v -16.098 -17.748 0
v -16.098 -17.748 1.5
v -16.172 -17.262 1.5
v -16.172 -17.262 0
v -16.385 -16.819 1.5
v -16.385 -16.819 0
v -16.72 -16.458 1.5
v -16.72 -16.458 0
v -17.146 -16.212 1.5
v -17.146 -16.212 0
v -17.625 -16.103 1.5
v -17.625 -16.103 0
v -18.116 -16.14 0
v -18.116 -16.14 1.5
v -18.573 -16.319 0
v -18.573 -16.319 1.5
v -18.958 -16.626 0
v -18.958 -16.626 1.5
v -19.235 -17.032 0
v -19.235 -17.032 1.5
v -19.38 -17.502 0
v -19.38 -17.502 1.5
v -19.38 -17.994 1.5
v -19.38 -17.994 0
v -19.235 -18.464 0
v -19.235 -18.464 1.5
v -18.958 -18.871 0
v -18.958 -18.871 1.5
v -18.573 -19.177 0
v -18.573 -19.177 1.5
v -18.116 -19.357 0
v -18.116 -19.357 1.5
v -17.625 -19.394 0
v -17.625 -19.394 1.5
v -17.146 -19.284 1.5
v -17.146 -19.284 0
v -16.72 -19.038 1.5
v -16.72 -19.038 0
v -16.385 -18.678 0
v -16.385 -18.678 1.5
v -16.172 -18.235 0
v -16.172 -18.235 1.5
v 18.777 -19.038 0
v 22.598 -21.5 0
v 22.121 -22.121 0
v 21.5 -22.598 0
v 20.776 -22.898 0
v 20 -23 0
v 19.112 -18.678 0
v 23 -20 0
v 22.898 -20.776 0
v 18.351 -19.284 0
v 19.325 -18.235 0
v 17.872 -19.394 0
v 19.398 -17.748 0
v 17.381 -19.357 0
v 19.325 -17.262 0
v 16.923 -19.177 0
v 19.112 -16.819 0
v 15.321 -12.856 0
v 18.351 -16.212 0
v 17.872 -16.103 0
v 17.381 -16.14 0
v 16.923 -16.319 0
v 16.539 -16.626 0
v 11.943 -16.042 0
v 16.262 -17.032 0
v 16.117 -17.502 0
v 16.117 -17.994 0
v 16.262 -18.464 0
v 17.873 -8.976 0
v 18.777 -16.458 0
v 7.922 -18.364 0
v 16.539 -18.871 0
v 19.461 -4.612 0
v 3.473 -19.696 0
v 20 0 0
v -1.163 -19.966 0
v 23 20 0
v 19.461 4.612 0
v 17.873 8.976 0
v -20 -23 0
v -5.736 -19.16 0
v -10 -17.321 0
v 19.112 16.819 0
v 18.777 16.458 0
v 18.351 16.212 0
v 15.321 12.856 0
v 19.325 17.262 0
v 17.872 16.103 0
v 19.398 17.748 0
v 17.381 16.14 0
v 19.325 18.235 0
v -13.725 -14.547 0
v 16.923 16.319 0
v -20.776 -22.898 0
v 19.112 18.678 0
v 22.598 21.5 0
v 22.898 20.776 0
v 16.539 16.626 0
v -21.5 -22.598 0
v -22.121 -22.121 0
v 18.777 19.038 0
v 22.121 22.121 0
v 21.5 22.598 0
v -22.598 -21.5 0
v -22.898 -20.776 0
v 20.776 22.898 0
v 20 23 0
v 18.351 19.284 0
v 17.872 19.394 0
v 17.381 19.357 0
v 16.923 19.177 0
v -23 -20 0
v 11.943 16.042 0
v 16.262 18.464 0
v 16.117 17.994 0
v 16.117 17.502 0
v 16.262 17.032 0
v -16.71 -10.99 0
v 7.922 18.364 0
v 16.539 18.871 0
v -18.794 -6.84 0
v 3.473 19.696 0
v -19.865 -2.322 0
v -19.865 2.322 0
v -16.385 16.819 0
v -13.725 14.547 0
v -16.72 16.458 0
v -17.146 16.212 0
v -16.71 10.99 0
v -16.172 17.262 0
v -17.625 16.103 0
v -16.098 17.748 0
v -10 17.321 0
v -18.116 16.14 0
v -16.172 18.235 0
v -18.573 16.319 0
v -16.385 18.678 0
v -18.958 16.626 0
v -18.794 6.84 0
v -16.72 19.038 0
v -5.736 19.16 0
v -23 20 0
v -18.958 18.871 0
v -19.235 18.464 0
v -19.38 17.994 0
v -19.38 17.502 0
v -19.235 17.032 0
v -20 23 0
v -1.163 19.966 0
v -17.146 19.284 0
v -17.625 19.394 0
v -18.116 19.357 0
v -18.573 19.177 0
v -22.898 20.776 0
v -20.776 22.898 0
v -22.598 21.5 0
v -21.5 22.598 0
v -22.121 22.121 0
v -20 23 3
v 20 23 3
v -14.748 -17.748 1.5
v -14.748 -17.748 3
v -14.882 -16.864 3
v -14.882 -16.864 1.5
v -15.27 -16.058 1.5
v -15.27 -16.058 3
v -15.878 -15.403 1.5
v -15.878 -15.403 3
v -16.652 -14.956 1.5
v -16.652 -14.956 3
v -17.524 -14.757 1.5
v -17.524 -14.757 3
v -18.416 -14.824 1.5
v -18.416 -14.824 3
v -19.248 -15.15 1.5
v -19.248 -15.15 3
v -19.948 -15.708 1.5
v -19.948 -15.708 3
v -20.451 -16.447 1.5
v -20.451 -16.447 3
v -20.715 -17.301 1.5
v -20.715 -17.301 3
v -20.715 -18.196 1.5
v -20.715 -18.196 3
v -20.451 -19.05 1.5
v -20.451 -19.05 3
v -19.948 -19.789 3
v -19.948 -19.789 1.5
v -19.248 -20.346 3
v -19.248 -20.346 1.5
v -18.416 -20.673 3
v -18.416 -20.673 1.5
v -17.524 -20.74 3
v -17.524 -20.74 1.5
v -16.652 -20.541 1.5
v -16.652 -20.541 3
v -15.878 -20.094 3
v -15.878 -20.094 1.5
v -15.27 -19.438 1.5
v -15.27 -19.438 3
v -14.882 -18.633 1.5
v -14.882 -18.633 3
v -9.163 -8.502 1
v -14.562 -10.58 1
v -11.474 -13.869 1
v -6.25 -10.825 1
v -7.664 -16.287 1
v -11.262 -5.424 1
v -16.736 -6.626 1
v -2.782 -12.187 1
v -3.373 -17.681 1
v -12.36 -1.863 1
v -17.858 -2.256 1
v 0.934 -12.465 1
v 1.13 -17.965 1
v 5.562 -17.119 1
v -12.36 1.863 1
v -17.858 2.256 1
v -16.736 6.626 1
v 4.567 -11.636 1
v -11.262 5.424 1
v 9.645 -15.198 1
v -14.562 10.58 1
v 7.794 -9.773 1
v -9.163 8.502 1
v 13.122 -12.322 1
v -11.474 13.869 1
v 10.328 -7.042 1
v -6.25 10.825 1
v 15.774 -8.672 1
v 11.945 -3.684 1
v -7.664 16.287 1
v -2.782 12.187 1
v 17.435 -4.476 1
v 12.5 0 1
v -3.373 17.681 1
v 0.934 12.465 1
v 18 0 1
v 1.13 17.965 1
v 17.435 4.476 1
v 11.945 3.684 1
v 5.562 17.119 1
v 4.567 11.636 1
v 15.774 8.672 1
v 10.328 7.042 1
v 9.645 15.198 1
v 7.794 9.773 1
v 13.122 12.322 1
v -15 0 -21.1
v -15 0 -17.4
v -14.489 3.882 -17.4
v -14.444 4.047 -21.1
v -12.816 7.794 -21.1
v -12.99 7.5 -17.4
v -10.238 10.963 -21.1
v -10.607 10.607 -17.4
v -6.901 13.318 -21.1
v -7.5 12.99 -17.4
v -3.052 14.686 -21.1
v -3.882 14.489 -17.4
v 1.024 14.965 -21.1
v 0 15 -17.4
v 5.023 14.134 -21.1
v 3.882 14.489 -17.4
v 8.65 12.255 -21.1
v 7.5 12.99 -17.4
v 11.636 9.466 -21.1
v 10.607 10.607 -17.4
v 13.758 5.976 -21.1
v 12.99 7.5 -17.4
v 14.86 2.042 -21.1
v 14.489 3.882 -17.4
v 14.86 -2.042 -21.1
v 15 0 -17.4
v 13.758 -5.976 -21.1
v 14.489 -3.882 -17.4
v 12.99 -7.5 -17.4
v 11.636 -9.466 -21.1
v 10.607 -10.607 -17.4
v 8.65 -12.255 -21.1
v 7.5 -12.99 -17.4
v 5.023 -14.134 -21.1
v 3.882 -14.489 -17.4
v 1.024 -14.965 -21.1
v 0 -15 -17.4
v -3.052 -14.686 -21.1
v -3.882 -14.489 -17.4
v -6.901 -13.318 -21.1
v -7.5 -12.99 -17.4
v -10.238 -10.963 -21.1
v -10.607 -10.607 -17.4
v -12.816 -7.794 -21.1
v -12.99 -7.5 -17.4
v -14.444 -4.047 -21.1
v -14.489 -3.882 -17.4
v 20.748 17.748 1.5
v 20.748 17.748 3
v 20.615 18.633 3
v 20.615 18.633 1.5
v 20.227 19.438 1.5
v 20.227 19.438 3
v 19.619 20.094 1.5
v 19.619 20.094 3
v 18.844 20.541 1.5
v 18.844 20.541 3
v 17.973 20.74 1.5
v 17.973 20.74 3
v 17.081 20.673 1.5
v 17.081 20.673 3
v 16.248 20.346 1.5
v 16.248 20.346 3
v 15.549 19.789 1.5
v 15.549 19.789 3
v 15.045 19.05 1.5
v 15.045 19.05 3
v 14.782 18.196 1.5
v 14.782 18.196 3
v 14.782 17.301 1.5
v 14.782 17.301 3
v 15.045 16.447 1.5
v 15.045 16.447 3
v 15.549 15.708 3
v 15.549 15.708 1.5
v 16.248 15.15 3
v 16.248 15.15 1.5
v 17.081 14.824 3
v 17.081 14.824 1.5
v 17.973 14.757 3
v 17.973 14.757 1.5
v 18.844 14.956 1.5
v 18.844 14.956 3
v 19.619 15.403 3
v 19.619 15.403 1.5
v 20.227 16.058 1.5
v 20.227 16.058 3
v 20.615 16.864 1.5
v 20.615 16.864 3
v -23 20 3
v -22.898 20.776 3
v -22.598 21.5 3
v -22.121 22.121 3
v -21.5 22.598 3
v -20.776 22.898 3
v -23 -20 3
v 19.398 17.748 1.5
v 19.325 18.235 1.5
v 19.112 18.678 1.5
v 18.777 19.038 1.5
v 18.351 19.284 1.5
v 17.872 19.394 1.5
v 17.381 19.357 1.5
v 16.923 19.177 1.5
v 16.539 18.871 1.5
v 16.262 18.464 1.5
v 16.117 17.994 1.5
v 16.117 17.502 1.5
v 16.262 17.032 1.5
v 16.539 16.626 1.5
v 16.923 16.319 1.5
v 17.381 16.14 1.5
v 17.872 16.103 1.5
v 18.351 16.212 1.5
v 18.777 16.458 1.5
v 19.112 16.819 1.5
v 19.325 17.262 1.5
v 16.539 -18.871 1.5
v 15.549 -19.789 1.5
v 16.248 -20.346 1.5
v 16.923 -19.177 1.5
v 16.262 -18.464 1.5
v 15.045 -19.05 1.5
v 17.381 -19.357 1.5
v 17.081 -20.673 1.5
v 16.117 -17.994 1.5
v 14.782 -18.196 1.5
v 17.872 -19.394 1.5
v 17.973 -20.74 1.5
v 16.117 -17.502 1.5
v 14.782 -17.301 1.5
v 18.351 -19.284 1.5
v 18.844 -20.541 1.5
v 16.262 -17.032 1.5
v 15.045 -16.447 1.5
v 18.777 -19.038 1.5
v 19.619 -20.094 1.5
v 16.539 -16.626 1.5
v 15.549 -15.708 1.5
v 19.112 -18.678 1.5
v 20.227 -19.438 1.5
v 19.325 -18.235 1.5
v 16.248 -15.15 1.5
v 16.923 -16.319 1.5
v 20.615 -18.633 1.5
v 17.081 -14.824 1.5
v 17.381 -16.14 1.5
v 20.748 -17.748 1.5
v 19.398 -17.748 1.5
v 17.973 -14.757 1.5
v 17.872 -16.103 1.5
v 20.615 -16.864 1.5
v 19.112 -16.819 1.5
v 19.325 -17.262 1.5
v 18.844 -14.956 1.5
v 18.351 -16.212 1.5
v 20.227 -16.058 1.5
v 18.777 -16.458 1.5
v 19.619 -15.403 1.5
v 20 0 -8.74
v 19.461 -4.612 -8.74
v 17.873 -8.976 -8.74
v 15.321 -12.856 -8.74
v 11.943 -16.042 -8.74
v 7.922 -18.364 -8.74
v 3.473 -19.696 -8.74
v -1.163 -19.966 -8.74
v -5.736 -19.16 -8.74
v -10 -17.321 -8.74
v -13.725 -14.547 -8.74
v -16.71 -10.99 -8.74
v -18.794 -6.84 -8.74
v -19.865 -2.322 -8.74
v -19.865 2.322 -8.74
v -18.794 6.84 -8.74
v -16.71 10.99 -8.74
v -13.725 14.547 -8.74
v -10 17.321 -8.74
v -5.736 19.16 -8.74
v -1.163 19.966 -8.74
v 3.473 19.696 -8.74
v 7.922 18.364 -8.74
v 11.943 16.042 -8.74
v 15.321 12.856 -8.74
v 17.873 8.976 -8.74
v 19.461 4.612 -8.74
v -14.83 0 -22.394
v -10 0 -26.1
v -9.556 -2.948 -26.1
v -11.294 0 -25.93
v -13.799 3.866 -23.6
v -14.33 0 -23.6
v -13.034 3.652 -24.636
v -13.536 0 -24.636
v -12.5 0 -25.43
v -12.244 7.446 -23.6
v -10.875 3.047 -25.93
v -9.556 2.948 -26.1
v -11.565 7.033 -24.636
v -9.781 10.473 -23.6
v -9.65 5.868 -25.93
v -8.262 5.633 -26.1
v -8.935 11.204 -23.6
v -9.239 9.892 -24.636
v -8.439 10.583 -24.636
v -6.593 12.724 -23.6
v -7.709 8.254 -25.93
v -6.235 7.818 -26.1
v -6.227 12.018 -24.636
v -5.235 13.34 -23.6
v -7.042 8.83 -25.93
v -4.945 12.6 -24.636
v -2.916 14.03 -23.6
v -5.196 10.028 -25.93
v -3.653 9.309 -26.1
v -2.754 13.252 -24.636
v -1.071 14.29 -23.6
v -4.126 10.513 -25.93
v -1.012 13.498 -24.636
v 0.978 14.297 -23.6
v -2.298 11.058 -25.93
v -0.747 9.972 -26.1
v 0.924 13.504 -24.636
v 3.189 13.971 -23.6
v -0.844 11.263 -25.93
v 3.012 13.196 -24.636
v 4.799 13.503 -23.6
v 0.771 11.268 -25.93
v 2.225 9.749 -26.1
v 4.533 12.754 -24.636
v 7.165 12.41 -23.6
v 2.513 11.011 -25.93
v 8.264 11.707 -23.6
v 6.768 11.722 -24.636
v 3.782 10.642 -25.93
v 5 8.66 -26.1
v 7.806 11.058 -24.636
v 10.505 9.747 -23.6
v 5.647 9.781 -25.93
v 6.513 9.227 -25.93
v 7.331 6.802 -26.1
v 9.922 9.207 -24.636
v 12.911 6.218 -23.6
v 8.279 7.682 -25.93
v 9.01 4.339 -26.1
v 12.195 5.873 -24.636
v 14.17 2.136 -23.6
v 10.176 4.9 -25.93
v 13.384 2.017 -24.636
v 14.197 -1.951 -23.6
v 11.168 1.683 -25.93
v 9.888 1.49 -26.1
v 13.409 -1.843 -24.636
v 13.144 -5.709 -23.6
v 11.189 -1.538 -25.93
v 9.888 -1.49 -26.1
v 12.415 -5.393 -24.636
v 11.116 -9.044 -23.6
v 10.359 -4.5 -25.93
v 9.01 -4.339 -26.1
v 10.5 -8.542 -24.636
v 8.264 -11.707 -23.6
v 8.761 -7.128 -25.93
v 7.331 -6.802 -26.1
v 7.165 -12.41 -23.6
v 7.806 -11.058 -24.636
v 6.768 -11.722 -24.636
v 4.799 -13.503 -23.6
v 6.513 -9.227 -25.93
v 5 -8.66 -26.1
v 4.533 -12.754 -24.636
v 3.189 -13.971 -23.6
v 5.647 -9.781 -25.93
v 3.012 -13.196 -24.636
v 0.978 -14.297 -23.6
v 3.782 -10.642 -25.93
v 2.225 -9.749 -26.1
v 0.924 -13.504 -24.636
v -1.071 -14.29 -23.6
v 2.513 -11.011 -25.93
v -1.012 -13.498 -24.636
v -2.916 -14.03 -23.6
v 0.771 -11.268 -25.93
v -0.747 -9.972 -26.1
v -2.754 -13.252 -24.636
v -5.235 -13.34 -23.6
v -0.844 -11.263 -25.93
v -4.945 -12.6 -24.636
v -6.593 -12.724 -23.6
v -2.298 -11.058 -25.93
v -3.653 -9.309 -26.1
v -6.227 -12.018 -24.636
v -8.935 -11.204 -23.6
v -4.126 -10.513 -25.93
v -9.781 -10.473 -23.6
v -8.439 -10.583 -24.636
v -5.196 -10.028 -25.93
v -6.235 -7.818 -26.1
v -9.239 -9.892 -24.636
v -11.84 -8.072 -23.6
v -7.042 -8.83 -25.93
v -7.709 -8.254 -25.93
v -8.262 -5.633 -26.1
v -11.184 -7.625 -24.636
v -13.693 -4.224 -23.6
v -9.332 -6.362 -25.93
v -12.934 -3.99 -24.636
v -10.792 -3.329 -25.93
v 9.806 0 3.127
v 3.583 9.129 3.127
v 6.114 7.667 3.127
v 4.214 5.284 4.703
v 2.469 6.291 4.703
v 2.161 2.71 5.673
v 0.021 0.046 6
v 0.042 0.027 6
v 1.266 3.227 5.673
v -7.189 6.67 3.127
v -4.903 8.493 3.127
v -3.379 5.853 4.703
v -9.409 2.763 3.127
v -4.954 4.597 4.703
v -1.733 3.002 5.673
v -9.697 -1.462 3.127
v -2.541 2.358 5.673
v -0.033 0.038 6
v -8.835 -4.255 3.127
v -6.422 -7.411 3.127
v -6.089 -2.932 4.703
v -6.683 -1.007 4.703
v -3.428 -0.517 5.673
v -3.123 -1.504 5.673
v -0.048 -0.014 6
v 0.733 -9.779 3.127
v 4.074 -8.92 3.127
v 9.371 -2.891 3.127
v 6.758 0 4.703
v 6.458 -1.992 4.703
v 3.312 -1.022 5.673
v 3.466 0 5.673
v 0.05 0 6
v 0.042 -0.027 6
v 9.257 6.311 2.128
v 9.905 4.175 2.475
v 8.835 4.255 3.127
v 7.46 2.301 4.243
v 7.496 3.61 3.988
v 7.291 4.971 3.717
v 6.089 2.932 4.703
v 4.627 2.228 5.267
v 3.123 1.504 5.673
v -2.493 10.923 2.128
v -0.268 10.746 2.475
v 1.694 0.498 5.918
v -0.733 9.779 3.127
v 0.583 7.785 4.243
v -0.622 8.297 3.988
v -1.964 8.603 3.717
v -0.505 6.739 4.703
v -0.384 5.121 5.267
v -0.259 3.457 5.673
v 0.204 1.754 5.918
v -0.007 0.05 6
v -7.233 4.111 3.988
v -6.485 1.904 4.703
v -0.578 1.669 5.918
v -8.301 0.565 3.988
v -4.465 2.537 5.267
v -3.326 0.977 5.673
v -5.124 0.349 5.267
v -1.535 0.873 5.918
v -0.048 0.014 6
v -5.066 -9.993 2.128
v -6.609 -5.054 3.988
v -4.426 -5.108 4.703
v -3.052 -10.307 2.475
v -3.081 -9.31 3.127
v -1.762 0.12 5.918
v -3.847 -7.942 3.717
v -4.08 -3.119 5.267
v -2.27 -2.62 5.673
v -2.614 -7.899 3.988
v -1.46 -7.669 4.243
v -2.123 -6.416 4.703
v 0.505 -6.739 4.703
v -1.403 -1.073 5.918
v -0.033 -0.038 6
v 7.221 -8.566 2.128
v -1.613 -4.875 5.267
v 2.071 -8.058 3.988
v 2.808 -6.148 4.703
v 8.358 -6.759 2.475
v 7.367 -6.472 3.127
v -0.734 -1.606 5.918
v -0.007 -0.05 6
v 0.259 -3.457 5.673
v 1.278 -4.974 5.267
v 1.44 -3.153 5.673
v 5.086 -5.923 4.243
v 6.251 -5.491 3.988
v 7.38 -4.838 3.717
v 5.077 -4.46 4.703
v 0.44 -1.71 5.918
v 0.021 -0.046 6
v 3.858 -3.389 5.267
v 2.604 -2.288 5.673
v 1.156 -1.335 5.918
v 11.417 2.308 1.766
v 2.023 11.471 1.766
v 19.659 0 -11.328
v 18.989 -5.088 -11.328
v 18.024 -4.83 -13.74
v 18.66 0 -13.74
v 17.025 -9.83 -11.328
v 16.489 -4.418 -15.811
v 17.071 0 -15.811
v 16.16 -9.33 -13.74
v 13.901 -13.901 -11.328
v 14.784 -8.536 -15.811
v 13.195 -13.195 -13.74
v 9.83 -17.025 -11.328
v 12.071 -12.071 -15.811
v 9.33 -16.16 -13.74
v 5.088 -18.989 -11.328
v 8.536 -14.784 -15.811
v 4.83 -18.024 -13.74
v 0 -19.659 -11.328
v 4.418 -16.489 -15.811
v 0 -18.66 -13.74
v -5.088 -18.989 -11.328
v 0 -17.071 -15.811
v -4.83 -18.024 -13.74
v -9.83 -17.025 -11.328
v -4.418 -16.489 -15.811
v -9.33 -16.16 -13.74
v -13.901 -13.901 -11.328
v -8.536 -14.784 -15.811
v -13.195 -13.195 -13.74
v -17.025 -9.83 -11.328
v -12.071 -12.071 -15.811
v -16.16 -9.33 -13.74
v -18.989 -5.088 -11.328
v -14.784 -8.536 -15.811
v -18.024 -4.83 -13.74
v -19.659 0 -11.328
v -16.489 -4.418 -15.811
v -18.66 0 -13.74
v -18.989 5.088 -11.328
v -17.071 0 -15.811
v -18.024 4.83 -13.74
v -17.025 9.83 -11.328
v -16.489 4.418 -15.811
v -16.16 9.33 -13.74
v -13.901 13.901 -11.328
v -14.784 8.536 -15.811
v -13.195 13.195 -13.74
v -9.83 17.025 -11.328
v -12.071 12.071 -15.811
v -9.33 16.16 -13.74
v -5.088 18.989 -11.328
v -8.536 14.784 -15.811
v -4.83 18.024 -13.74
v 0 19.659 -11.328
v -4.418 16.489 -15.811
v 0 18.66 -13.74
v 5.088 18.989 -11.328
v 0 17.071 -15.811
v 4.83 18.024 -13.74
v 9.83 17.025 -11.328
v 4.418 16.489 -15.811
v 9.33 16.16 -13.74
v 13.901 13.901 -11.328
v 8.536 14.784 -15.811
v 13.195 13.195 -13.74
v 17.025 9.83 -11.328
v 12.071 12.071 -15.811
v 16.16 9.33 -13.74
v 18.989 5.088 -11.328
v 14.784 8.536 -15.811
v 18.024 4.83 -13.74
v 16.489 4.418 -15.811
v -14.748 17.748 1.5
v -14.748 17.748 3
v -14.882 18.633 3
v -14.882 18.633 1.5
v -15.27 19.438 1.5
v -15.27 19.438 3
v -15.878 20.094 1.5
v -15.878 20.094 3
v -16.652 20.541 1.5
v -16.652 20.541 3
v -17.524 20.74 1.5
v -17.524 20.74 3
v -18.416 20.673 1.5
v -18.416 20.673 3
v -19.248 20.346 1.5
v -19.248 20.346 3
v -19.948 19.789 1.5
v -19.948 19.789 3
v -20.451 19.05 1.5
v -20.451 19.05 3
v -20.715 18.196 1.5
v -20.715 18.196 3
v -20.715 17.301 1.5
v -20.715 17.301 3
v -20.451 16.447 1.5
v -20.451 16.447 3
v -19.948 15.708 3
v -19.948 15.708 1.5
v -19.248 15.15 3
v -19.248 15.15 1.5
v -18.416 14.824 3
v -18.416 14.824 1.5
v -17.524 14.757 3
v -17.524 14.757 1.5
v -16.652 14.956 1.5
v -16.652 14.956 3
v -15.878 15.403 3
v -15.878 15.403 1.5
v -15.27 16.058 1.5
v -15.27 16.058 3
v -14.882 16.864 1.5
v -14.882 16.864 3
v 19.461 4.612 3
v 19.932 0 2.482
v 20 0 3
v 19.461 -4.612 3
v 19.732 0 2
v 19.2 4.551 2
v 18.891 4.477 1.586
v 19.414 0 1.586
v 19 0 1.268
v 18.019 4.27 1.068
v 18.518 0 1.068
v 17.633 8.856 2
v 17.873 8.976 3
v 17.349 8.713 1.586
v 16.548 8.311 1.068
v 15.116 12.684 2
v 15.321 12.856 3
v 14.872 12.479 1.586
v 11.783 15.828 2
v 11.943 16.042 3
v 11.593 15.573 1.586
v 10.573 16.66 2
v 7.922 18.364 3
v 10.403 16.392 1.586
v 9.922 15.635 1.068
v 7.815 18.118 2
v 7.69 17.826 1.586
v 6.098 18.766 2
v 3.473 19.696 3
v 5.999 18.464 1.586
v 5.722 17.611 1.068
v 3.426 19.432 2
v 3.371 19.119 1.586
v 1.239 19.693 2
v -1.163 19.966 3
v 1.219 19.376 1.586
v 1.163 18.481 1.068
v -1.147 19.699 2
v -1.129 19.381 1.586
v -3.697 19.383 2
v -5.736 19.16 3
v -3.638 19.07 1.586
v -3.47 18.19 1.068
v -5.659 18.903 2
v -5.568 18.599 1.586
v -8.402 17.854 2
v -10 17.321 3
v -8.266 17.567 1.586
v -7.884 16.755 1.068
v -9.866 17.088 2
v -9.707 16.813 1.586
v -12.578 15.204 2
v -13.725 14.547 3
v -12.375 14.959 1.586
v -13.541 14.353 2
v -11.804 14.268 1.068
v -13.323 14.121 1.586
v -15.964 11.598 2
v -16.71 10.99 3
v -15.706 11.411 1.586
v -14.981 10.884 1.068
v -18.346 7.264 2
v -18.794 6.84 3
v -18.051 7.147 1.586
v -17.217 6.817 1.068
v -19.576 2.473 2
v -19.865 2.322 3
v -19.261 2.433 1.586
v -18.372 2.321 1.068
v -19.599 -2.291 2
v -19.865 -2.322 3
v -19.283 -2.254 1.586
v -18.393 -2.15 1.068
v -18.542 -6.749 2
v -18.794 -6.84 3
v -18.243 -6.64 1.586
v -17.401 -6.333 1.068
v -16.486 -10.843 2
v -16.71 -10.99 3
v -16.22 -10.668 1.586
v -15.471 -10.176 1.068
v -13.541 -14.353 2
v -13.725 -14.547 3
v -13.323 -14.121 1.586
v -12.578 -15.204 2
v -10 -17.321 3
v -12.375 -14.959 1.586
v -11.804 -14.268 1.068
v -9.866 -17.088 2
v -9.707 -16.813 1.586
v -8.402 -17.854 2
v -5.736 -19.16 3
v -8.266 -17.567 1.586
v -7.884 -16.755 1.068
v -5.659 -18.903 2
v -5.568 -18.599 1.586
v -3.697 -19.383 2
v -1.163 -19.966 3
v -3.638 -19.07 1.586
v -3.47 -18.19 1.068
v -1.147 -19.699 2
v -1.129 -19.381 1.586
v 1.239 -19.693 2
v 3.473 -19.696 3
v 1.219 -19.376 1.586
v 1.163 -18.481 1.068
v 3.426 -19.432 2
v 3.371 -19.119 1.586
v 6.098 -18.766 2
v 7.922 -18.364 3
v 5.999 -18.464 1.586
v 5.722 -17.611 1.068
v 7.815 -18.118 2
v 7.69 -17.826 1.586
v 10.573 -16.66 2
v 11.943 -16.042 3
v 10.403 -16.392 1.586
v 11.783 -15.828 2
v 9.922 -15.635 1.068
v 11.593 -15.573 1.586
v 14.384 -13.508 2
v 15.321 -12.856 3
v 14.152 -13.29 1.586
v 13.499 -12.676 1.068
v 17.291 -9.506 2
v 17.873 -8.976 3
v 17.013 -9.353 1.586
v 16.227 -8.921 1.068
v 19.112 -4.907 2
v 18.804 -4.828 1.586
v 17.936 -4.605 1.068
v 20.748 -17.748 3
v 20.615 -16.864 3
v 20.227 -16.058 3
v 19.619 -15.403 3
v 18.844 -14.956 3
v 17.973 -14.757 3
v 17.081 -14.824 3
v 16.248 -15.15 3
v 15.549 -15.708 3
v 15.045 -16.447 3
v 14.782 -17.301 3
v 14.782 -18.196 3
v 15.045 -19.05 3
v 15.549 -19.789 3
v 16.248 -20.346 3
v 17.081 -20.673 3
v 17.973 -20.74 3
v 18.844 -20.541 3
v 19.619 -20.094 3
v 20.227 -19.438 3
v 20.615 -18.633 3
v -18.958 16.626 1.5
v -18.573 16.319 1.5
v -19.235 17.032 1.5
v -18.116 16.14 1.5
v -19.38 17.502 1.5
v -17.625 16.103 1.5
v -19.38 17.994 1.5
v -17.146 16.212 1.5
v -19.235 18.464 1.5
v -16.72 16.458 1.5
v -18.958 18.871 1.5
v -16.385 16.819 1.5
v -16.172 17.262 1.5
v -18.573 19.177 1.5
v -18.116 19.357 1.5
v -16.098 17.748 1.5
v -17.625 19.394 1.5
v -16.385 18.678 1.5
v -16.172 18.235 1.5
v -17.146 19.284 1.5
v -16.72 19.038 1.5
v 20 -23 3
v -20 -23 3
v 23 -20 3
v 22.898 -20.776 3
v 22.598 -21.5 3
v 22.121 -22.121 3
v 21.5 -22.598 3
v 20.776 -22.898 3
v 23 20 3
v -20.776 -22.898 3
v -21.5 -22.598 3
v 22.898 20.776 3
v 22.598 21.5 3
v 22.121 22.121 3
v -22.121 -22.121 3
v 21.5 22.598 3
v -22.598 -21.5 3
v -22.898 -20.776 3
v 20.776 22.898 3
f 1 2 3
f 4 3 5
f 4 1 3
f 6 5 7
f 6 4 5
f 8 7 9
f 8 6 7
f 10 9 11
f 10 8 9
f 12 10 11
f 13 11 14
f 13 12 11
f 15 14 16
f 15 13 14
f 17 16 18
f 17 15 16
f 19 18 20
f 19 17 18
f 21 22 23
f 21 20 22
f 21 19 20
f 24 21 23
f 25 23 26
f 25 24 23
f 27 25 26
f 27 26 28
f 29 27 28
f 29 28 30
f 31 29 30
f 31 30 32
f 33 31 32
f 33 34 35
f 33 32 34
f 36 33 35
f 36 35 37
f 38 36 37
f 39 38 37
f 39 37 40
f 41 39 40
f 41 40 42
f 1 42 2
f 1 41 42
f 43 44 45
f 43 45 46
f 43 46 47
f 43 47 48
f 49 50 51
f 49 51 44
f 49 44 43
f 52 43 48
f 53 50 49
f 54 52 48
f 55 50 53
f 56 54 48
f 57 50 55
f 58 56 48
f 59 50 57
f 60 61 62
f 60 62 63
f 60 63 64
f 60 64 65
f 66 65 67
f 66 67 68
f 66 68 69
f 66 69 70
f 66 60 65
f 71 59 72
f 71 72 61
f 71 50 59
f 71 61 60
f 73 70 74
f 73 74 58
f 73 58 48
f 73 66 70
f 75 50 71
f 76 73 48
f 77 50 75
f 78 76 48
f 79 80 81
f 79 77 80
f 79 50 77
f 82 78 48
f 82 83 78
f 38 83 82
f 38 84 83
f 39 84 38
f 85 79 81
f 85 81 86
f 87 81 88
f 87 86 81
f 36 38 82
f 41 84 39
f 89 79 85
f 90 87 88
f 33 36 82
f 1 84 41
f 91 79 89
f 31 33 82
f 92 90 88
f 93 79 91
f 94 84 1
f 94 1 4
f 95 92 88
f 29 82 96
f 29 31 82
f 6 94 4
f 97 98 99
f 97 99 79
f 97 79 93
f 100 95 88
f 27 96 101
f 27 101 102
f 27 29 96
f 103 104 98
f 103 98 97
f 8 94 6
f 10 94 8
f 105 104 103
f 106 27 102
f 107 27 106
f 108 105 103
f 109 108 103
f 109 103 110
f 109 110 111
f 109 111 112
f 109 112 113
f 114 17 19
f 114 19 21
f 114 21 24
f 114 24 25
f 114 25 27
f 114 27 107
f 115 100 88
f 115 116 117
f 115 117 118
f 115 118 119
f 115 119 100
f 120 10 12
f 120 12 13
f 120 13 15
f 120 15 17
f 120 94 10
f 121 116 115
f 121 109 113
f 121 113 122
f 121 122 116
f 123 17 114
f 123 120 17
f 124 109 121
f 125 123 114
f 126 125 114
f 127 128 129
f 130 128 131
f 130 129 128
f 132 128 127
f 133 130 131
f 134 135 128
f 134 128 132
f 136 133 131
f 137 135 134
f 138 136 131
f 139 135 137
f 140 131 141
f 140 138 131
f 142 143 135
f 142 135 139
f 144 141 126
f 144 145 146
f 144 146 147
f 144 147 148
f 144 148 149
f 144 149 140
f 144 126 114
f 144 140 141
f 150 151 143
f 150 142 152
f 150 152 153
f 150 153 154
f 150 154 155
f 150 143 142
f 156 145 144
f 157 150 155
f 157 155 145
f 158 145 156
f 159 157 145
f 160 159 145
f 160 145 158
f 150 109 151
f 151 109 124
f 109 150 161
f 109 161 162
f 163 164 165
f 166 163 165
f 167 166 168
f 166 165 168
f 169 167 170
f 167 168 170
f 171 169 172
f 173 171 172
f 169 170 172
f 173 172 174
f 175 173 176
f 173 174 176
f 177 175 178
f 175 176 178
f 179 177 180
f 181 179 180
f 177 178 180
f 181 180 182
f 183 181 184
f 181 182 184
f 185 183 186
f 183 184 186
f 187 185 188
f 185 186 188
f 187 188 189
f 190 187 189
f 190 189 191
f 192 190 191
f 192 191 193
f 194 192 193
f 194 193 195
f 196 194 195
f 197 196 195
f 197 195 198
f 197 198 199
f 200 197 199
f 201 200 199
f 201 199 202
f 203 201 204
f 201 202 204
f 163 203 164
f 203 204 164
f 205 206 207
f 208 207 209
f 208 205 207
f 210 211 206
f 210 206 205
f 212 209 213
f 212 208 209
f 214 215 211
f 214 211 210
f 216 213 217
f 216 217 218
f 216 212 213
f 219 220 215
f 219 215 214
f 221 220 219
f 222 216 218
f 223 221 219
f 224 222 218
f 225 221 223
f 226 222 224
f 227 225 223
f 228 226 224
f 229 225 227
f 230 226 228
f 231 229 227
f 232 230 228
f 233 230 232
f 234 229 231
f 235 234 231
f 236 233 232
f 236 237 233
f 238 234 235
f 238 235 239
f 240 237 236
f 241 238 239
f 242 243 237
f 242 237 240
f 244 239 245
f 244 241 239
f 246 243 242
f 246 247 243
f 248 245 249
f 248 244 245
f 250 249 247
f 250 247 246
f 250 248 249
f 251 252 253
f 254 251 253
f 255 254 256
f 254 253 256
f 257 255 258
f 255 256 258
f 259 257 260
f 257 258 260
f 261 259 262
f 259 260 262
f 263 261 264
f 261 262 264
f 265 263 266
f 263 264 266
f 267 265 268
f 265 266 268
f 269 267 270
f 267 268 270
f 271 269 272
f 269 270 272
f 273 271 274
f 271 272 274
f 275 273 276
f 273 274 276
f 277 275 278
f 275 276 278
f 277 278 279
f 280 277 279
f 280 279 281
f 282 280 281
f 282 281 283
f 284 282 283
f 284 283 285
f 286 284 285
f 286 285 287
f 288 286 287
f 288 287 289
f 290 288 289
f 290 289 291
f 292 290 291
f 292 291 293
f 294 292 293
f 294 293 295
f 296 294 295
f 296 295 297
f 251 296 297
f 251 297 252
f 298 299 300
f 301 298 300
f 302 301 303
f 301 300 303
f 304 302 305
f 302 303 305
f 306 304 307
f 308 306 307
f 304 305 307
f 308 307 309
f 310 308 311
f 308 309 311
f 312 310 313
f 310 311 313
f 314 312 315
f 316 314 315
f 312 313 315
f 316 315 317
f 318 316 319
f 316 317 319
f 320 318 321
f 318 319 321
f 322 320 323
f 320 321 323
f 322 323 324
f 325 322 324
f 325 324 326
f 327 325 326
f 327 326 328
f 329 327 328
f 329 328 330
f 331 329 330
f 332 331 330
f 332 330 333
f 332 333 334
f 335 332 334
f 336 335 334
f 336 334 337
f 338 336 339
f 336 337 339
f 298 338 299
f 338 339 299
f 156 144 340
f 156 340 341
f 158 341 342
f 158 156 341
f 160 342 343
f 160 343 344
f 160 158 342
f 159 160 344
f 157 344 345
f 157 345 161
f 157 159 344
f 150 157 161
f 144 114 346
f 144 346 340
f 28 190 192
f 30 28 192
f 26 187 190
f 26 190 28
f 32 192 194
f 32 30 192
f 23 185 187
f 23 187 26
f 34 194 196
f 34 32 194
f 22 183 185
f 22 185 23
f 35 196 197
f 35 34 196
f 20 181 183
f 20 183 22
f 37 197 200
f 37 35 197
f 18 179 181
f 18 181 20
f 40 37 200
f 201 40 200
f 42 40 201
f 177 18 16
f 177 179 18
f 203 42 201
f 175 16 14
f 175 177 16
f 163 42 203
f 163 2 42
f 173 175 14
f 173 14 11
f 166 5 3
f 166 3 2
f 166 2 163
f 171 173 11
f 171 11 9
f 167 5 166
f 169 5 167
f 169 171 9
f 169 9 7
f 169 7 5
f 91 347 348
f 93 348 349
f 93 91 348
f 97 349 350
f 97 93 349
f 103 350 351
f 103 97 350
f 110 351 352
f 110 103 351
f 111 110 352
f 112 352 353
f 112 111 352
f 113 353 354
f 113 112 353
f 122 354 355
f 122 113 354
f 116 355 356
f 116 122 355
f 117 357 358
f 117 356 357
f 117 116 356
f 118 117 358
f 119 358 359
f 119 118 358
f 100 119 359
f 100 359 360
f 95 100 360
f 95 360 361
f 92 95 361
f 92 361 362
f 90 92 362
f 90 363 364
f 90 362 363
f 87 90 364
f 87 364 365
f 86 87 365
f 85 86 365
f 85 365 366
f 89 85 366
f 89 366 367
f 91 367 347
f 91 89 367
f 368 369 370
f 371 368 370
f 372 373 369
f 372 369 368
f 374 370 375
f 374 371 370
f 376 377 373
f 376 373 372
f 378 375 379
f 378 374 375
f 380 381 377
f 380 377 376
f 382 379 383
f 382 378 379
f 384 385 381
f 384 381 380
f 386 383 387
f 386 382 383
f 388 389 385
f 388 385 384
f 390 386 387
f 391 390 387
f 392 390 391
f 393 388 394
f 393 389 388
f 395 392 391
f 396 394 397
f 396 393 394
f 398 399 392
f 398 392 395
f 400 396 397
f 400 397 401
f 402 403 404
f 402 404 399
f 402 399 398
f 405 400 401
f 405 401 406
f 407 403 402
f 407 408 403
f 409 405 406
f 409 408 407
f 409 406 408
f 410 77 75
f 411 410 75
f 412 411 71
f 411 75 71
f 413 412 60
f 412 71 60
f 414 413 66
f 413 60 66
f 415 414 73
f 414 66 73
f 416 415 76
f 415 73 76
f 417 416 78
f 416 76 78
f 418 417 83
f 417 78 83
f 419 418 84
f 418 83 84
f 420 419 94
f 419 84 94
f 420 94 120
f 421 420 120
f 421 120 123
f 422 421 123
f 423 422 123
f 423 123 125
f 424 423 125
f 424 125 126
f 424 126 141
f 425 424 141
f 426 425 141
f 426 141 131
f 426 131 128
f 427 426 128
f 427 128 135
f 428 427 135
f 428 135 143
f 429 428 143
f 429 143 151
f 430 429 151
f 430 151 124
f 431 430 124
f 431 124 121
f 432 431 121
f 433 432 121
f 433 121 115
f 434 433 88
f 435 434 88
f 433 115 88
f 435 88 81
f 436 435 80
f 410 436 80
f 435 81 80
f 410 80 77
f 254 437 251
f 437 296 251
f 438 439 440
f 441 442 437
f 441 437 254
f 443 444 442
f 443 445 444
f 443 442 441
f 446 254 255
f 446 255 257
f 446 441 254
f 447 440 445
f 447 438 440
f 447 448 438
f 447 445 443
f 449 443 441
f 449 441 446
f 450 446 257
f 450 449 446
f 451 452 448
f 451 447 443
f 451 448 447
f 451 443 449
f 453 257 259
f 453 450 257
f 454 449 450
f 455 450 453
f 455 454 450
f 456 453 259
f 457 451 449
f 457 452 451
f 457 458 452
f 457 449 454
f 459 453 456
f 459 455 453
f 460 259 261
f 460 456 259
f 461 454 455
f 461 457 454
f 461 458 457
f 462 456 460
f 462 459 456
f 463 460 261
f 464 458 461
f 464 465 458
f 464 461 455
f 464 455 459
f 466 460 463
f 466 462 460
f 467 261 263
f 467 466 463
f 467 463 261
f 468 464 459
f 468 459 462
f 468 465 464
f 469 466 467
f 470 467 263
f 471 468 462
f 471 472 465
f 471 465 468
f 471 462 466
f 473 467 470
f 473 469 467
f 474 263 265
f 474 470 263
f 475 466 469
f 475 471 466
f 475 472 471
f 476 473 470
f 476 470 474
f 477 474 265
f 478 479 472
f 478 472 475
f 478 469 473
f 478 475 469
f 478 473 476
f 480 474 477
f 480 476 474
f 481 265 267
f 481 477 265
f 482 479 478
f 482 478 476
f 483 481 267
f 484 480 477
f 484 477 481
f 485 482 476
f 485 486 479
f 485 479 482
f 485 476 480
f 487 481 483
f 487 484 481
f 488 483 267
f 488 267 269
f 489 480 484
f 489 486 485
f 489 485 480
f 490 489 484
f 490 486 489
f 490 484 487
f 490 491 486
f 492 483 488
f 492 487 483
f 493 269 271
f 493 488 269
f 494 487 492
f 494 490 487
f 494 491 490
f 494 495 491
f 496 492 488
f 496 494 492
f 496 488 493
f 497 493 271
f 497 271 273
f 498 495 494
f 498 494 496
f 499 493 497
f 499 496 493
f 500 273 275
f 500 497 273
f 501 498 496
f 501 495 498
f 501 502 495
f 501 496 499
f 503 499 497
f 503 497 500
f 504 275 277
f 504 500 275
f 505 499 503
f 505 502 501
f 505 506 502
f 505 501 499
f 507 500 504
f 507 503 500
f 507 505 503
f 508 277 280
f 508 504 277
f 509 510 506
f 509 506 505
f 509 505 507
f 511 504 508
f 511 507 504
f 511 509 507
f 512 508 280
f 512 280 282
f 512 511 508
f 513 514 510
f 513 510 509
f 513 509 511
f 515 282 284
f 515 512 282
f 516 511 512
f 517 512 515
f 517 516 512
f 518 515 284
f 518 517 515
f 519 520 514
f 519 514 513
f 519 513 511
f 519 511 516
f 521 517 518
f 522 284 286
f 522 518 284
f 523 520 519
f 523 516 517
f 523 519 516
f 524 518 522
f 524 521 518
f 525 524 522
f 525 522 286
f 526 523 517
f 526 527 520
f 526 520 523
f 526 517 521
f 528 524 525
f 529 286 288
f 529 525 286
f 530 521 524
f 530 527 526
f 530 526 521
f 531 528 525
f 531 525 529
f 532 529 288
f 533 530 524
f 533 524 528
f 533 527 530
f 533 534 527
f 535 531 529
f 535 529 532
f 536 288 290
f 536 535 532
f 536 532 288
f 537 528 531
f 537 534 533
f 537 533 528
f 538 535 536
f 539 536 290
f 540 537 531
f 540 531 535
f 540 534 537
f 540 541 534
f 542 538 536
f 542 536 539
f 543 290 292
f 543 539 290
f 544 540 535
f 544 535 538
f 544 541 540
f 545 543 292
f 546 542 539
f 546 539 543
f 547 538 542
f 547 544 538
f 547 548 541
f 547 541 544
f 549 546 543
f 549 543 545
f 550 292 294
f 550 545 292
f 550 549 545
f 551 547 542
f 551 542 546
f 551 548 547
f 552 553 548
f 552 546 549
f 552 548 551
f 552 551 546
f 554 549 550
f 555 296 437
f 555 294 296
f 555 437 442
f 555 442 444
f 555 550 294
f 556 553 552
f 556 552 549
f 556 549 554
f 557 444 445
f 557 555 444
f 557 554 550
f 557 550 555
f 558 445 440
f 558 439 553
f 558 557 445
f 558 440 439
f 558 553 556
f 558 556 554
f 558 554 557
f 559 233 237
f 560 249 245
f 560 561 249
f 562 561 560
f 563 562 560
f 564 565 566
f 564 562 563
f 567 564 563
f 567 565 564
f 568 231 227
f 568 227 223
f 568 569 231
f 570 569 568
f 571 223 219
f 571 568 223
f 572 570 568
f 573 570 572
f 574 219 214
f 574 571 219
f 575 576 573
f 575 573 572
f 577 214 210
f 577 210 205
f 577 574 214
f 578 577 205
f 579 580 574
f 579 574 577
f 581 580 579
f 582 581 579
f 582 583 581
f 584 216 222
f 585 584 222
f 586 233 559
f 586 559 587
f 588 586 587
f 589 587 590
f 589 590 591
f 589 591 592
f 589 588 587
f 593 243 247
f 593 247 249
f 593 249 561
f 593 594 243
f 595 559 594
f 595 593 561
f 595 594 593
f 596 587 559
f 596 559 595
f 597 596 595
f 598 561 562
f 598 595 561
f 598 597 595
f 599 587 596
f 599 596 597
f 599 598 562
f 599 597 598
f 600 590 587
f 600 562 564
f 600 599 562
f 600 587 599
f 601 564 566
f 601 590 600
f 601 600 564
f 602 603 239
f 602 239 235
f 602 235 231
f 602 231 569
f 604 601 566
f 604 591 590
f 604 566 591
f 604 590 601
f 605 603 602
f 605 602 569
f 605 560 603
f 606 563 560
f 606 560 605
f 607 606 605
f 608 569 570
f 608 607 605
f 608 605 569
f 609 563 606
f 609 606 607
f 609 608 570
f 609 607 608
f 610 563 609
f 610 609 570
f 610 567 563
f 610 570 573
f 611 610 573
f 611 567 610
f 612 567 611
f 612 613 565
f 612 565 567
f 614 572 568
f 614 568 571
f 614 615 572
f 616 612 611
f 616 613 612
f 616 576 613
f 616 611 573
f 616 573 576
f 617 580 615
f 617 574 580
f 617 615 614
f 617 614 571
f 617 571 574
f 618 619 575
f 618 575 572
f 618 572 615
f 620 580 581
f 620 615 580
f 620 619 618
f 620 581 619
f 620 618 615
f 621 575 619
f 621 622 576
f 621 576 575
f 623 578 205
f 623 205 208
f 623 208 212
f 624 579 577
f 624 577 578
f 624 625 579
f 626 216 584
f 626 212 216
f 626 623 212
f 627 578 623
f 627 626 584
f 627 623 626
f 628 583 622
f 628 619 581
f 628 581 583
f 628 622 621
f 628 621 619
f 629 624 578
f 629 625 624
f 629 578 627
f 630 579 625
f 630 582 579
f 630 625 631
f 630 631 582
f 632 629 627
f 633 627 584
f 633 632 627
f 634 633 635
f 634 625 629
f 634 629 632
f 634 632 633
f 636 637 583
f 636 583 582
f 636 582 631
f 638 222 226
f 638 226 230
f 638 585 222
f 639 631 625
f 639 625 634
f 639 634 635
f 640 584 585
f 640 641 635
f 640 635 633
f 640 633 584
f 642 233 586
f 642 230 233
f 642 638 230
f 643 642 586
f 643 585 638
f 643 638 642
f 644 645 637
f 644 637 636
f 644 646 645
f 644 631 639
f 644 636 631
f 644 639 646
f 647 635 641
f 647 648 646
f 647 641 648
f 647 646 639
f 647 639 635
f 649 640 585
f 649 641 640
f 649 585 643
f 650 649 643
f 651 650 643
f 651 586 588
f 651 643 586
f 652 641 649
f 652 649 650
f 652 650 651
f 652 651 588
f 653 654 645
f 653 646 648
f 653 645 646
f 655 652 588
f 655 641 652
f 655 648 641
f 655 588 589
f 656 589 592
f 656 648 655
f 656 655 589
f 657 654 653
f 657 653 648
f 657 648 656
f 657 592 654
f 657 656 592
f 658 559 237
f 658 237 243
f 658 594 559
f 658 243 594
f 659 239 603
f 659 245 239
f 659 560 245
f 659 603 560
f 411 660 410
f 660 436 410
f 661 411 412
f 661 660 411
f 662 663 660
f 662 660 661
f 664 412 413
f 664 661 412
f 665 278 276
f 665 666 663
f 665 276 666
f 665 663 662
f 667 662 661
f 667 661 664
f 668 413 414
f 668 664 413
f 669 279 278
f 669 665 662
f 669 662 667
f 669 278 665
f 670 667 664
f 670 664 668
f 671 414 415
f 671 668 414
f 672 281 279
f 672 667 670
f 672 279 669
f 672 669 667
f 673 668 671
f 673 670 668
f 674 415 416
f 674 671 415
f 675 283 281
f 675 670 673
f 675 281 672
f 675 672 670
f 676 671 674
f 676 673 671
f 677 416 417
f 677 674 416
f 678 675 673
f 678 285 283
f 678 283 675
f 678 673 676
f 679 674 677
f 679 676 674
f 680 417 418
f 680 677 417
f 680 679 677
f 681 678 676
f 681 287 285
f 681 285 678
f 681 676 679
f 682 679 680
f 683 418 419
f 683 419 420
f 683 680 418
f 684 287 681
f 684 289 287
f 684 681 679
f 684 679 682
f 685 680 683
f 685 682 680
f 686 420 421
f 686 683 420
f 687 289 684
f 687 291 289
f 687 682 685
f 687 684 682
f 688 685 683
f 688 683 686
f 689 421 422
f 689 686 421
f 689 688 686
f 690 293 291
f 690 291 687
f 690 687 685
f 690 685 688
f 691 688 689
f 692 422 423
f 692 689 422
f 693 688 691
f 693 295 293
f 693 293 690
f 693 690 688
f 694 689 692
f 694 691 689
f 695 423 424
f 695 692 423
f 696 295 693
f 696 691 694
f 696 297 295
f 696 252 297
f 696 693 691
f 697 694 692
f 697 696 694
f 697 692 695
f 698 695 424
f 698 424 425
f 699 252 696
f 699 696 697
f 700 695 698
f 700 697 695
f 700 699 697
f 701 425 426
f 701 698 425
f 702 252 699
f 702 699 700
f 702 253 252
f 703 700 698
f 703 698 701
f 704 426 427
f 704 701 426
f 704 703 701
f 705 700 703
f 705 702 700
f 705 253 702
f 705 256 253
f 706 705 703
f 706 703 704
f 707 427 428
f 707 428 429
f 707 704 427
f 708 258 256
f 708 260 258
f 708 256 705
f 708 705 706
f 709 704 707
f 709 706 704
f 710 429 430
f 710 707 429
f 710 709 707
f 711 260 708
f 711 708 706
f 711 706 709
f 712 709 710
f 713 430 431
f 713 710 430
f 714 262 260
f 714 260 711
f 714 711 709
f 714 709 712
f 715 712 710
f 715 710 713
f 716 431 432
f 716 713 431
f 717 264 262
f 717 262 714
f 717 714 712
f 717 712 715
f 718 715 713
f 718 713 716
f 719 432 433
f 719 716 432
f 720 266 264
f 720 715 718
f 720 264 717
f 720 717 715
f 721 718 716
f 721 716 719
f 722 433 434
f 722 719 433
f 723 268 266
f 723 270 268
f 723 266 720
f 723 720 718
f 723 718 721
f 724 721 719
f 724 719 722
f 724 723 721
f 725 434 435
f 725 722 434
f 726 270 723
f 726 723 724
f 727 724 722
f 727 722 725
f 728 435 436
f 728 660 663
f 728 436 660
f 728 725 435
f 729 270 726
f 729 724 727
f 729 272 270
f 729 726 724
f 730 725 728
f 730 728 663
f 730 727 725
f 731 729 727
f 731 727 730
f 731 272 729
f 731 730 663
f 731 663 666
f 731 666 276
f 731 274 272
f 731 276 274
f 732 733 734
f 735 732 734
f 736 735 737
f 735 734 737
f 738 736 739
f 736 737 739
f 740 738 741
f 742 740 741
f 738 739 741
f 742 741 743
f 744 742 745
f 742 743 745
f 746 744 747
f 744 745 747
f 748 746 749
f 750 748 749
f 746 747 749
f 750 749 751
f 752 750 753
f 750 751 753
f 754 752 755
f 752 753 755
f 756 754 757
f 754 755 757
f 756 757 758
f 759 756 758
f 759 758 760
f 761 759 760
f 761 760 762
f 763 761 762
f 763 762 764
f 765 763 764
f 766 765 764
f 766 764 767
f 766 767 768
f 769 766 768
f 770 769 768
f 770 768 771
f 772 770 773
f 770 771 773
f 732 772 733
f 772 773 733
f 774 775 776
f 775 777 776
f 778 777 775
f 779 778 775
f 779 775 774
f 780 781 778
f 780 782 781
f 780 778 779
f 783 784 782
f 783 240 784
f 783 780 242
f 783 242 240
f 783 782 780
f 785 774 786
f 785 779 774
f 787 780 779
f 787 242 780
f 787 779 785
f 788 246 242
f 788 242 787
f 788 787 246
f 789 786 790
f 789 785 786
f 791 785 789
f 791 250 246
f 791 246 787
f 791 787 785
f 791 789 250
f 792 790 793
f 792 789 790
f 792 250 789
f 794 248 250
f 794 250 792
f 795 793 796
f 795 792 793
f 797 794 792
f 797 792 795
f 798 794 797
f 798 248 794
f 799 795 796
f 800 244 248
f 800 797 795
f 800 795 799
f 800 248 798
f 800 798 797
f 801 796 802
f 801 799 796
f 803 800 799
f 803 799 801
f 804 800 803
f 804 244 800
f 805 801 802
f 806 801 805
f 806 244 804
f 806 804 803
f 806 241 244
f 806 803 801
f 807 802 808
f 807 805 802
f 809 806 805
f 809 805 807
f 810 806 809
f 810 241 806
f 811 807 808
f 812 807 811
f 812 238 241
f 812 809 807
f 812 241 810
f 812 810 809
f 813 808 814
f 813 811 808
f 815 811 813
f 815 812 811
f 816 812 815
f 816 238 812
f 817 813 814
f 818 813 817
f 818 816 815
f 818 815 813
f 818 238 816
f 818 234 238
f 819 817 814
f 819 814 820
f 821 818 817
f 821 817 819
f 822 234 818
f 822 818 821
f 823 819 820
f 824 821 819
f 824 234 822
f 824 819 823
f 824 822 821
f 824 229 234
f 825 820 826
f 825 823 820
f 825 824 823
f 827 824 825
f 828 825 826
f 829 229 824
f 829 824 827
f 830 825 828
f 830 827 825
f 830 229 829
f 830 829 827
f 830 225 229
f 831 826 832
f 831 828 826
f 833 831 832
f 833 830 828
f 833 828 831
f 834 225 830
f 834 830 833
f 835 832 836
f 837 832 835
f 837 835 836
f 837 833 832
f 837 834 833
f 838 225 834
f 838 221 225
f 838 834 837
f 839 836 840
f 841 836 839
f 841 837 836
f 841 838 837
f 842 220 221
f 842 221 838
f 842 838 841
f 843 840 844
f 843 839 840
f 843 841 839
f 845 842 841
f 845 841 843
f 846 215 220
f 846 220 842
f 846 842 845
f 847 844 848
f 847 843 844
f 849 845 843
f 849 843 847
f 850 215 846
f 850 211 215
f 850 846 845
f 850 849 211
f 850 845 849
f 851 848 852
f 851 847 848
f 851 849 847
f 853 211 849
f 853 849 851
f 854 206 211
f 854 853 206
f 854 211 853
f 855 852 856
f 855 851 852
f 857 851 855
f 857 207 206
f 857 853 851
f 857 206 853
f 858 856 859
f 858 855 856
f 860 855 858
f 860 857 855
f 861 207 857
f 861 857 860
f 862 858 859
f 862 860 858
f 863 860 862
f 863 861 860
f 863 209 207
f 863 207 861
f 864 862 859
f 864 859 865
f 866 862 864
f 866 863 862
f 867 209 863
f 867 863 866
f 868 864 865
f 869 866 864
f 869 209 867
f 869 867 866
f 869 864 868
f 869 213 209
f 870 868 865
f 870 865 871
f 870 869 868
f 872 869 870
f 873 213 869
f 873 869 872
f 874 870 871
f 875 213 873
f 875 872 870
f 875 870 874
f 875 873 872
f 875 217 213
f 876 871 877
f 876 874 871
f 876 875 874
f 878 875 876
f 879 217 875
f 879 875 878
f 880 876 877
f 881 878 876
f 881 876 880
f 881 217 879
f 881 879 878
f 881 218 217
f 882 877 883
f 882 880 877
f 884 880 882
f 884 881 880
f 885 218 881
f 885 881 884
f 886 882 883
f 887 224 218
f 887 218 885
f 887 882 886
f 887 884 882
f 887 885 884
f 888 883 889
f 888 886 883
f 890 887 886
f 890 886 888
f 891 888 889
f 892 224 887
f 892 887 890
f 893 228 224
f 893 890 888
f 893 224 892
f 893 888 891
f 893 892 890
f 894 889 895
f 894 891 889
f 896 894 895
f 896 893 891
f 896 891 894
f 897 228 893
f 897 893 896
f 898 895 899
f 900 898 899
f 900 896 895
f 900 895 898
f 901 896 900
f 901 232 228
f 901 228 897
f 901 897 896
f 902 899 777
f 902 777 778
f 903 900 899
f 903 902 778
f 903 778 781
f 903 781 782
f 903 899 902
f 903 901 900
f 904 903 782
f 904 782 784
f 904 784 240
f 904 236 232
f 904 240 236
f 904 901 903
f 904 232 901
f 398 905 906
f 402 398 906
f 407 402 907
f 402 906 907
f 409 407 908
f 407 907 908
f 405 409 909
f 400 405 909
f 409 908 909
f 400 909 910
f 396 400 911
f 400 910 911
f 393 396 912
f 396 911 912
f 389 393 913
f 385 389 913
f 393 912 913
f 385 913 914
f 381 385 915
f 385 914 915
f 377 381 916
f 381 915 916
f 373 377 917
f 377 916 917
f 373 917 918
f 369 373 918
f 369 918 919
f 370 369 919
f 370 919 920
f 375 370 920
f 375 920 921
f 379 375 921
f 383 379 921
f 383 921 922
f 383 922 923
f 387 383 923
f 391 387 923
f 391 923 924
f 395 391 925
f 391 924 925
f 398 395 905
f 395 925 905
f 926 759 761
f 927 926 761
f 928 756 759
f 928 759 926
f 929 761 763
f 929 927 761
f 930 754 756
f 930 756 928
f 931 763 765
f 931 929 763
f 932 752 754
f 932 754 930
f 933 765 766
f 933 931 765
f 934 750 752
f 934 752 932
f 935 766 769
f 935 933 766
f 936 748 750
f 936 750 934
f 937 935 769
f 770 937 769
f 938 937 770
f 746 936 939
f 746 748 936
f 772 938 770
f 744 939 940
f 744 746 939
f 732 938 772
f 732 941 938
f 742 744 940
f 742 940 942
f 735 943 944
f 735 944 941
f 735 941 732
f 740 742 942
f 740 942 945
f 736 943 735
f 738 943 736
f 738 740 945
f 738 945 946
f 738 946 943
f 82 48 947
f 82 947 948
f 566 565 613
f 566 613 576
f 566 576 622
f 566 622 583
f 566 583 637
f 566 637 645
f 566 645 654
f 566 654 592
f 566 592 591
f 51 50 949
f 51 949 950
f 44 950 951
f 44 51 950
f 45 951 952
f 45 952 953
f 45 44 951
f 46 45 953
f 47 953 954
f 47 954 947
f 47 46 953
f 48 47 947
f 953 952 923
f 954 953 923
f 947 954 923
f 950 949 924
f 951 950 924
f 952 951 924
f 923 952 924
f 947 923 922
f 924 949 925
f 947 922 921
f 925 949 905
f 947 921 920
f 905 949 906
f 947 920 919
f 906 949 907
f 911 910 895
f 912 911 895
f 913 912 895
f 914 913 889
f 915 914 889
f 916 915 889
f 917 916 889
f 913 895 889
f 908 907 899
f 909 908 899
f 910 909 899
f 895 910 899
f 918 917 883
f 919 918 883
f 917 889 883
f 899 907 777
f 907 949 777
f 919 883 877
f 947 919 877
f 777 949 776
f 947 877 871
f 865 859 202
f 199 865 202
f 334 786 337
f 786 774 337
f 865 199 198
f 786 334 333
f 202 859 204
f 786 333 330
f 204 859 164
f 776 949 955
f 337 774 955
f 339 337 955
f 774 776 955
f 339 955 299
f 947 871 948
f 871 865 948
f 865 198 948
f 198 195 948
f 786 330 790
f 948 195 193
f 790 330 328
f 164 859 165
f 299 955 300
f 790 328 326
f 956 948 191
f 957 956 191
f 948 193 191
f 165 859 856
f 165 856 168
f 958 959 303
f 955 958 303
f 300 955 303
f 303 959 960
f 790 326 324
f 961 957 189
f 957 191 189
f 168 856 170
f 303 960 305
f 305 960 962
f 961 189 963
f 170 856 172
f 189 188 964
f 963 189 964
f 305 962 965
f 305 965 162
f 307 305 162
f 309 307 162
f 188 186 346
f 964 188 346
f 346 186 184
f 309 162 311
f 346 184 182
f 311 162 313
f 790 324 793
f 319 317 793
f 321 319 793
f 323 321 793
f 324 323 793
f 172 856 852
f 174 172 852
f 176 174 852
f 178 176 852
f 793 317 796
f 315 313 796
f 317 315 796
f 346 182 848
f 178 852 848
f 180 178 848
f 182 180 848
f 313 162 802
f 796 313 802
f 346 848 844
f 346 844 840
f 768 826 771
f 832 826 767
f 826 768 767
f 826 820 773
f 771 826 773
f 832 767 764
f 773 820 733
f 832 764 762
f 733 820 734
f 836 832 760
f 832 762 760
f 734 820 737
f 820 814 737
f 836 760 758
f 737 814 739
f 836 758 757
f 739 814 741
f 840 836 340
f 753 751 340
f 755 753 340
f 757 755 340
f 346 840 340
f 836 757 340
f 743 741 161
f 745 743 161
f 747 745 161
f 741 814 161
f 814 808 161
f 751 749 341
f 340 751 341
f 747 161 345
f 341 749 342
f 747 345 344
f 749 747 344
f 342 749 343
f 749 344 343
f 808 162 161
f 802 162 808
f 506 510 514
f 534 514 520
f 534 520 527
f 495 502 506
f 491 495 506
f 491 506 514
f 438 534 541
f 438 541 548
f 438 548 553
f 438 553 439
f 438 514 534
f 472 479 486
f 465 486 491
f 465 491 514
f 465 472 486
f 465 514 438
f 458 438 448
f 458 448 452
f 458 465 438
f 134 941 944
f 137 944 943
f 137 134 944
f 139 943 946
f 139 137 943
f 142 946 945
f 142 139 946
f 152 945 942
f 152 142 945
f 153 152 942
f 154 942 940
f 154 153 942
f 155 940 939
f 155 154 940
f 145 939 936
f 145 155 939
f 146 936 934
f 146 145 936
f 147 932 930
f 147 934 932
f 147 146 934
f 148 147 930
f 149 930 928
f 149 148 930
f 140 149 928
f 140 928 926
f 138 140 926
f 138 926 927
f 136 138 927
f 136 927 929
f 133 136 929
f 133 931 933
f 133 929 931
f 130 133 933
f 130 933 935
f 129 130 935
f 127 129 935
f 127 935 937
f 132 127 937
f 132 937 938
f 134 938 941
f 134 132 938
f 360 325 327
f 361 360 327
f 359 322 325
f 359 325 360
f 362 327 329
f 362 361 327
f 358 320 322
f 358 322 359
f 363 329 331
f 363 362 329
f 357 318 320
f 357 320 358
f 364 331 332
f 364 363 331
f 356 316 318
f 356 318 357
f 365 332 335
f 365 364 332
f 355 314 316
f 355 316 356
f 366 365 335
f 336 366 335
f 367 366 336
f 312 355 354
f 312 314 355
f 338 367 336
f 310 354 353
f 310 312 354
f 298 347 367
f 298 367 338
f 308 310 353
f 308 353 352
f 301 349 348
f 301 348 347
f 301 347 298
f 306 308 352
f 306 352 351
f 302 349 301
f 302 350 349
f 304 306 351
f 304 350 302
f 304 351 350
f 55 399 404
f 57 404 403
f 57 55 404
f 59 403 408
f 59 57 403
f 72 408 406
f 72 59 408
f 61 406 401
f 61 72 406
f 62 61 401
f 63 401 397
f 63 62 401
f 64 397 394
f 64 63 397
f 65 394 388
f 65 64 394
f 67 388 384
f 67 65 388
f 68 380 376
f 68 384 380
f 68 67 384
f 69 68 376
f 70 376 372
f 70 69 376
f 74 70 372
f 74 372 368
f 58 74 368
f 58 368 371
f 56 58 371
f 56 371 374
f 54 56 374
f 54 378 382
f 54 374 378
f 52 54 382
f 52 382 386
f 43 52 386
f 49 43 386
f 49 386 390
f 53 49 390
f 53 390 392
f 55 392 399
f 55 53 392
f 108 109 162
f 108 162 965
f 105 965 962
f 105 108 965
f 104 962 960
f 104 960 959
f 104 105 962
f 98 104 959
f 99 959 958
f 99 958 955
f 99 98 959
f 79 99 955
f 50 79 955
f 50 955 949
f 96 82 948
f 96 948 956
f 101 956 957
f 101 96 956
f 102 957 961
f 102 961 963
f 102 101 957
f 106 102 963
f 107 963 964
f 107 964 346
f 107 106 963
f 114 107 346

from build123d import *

# Parameters (mm, degrees)
ESQUISSE1_R             = 1.65
BOSS_EXTRU_1_DEPTH      = 3
ESQUISSE2_R             = 3
ENL_V_MAT_EXTRU_1_DEPTH = 1.5
ESQUISSE3_R             = 20
BOSS_EXTRU_2_DEPTH      = 17.4
ESQUISSE4_R             = 15
BOSS_EXTRU_3_DEPTH      = 8.7
CONG_1_R                = 10
CONG_2_R                = 5
ESQUISSE5_R             = 20
ENL_V_MAT_EXTRU_2_DEPTH = 2
ESQUISSE6_R             = 12.5
BOSS_EXTRU_4_DEPTH      = 5
CONG_3_R                = 18
CONG_4_R                = 2


# Some blends are built 0.0001 mm under size
with BuildPart() as part:
    # Esquisse1 → Boss.-Extru.1 (new body)
    with BuildSketch(Plane.XY):
        with BuildLine():
            Line((-20, 23), (20, 23))
            ThreePointArc((20, 23), (22.121320344, 22.121320344), (23, 20))
            Line((23, 20), (23, -20))
            ThreePointArc((23, -20), (22.121320344, -22.121320344), (20, -23))
            Line((20, -23), (-20, -23))
            ThreePointArc((-20, -23), (-22.121320344, -22.121320344), (-23, -20))
            Line((-23, -20), (-23, 20))
            ThreePointArc((-23, 20), (-22.121320344, 22.121320344), (-20, 23))
        make_face()
        with Locations((17.748380208, 17.748380208)):
            Circle(ESQUISSE1_R, mode=Mode.SUBTRACT)
        with Locations((-17.748380208, 17.748380208)):
            Circle(ESQUISSE1_R, mode=Mode.SUBTRACT)
        with Locations((17.748380208, -17.748380208)):
            Circle(ESQUISSE1_R, mode=Mode.SUBTRACT)
        with Locations((-17.748380208, -17.748380208)):
            Circle(ESQUISSE1_R, mode=Mode.SUBTRACT)
    extrude(amount=BOSS_EXTRU_1_DEPTH)

    # Esquisse2 → Enlèv. mat.-Extru.1 (cut)
    with BuildSketch(Plane.XY.offset(3)):
        with Locations((-17.748380208, 17.748380208)):
            Circle(ESQUISSE2_R)
        with Locations((17.748380208, 17.748380208)):
            Circle(ESQUISSE2_R)
        with Locations((17.748380208, -17.748380208)):
            Circle(ESQUISSE2_R)
        with Locations((-17.748380208, -17.748380208)):
            Circle(ESQUISSE2_R)
    extrude(amount=-ENL_V_MAT_EXTRU_1_DEPTH, mode=Mode.SUBTRACT)

    # Esquisse3 → Boss.-Extru.2 (add)
    with BuildSketch(Plane(origin=(0, 0, 0), x_dir=(-1, 0, 0), z_dir=(0, 0, -1))):
        with Locations(Location((0, 0, 0), (0, 0, 180))):
            Circle(ESQUISSE3_R)
    extrude(amount=BOSS_EXTRU_2_DEPTH)

    # Esquisse4 → Boss.-Extru.3 (add)
    with BuildSketch(Plane(origin=(0, 0, -17.4), x_dir=(-1, 0, 0), z_dir=(0, 0, -1))):
        Circle(ESQUISSE4_R)
    extrude(amount=BOSS_EXTRU_3_DEPTH)

    # Congé1
    # the kernel refuses this fillet: 10 mm, written as the material it takes off along each edge
    with BuildSketch(Plane(origin=(0, 0, -17.4), x_dir=(1, 0, 0), z_dir=(0, 1, 0))) as cong_1_piece_1_section:
        with BuildLine():
            CenterArc((10, -8.660254038), CONG_1_R, 0, 60)
            Line((15, 0), (15.1, 0.173205081))
            ThreePointArc((15.1, 0.173205081), (17.5, 0.2), (20, 0.2))
            Line((20, 0.2), (20.2, 0))
            Line((20.2, 0), (20.2, -8.660254038))
            Line((20.2, -8.660254038), (20, -8.660254038))
        make_face()
    cong_1_piece_1 = revolve(axis=Axis((0, 0, -17.4), (0, 0, -1)), mode=Mode.PRIVATE)
    cong_1_piece_1 = cong_1_piece_1 - Plane(origin=(0, 0, -13.800562686), x_dir=(-1, 0, 0), z_dir=(0, 0, 1)) * Cylinder(15, 81, mode=Mode.PRIVATE)
    add(cong_1_piece_1, mode=Mode.SUBTRACT)

    # Congé2
    cong_2_edges = [part.edges().sort_by_distance(p)[0] for p in [
        (15, 0, -26.1),
    ]]
    fillet(cong_2_edges, radius=CONG_2_R)

    # Esquisse5 → Enlèv. mat.-Extru.2 (cut)
    with BuildSketch(Plane.XY.offset(3)):
        Circle(ESQUISSE5_R)
    extrude(amount=-ENL_V_MAT_EXTRU_2_DEPTH, mode=Mode.SUBTRACT)

    # Esquisse6 → Boss.-Extru.4 (add)
    with BuildSketch(Plane.XY.offset(1)):
        Circle(ESQUISSE6_R)
    extrude(amount=BOSS_EXTRU_4_DEPTH)

    # Congé3
    # the kernel refuses this fillet: 18 mm, written as the material it takes off along each edge
    with BuildSketch(Plane(origin=(0, 0, 6), x_dir=(1, 0, 0), z_dir=(0, -1, 0))) as cong_3_piece_1:
        with BuildLine():
            CenterArc((0.050100402, -18), CONG_3_R, 46.238257307, 43.761742693)
            Line((0.050100402, 0), (0.050100402, 0.36))
            Line((0.050100402, 0.36), (12.5, 0.36))
            Line((12.5, 0.36), (12.86, 0))
            ThreePointArc((12.86, 0), (12.86, -2.5), (12.748997992, -4.74))
            Line((12.748997992, -4.74), (12.5, -5))
        make_face()
    revolve(axis=Axis((0, 0, 6), (0, 0, 1)), mode=Mode.SUBTRACT)

    # Congé4
    cong_4_edges = [part.edges().sort_by_distance(p)[0] for p in [
        (-20, 0, 1),
    ]]
    fillet(cong_4_edges, radius=CONG_4_R - 0.0001)  # a hair under: the kernel refuses the full size


solid = part.part
